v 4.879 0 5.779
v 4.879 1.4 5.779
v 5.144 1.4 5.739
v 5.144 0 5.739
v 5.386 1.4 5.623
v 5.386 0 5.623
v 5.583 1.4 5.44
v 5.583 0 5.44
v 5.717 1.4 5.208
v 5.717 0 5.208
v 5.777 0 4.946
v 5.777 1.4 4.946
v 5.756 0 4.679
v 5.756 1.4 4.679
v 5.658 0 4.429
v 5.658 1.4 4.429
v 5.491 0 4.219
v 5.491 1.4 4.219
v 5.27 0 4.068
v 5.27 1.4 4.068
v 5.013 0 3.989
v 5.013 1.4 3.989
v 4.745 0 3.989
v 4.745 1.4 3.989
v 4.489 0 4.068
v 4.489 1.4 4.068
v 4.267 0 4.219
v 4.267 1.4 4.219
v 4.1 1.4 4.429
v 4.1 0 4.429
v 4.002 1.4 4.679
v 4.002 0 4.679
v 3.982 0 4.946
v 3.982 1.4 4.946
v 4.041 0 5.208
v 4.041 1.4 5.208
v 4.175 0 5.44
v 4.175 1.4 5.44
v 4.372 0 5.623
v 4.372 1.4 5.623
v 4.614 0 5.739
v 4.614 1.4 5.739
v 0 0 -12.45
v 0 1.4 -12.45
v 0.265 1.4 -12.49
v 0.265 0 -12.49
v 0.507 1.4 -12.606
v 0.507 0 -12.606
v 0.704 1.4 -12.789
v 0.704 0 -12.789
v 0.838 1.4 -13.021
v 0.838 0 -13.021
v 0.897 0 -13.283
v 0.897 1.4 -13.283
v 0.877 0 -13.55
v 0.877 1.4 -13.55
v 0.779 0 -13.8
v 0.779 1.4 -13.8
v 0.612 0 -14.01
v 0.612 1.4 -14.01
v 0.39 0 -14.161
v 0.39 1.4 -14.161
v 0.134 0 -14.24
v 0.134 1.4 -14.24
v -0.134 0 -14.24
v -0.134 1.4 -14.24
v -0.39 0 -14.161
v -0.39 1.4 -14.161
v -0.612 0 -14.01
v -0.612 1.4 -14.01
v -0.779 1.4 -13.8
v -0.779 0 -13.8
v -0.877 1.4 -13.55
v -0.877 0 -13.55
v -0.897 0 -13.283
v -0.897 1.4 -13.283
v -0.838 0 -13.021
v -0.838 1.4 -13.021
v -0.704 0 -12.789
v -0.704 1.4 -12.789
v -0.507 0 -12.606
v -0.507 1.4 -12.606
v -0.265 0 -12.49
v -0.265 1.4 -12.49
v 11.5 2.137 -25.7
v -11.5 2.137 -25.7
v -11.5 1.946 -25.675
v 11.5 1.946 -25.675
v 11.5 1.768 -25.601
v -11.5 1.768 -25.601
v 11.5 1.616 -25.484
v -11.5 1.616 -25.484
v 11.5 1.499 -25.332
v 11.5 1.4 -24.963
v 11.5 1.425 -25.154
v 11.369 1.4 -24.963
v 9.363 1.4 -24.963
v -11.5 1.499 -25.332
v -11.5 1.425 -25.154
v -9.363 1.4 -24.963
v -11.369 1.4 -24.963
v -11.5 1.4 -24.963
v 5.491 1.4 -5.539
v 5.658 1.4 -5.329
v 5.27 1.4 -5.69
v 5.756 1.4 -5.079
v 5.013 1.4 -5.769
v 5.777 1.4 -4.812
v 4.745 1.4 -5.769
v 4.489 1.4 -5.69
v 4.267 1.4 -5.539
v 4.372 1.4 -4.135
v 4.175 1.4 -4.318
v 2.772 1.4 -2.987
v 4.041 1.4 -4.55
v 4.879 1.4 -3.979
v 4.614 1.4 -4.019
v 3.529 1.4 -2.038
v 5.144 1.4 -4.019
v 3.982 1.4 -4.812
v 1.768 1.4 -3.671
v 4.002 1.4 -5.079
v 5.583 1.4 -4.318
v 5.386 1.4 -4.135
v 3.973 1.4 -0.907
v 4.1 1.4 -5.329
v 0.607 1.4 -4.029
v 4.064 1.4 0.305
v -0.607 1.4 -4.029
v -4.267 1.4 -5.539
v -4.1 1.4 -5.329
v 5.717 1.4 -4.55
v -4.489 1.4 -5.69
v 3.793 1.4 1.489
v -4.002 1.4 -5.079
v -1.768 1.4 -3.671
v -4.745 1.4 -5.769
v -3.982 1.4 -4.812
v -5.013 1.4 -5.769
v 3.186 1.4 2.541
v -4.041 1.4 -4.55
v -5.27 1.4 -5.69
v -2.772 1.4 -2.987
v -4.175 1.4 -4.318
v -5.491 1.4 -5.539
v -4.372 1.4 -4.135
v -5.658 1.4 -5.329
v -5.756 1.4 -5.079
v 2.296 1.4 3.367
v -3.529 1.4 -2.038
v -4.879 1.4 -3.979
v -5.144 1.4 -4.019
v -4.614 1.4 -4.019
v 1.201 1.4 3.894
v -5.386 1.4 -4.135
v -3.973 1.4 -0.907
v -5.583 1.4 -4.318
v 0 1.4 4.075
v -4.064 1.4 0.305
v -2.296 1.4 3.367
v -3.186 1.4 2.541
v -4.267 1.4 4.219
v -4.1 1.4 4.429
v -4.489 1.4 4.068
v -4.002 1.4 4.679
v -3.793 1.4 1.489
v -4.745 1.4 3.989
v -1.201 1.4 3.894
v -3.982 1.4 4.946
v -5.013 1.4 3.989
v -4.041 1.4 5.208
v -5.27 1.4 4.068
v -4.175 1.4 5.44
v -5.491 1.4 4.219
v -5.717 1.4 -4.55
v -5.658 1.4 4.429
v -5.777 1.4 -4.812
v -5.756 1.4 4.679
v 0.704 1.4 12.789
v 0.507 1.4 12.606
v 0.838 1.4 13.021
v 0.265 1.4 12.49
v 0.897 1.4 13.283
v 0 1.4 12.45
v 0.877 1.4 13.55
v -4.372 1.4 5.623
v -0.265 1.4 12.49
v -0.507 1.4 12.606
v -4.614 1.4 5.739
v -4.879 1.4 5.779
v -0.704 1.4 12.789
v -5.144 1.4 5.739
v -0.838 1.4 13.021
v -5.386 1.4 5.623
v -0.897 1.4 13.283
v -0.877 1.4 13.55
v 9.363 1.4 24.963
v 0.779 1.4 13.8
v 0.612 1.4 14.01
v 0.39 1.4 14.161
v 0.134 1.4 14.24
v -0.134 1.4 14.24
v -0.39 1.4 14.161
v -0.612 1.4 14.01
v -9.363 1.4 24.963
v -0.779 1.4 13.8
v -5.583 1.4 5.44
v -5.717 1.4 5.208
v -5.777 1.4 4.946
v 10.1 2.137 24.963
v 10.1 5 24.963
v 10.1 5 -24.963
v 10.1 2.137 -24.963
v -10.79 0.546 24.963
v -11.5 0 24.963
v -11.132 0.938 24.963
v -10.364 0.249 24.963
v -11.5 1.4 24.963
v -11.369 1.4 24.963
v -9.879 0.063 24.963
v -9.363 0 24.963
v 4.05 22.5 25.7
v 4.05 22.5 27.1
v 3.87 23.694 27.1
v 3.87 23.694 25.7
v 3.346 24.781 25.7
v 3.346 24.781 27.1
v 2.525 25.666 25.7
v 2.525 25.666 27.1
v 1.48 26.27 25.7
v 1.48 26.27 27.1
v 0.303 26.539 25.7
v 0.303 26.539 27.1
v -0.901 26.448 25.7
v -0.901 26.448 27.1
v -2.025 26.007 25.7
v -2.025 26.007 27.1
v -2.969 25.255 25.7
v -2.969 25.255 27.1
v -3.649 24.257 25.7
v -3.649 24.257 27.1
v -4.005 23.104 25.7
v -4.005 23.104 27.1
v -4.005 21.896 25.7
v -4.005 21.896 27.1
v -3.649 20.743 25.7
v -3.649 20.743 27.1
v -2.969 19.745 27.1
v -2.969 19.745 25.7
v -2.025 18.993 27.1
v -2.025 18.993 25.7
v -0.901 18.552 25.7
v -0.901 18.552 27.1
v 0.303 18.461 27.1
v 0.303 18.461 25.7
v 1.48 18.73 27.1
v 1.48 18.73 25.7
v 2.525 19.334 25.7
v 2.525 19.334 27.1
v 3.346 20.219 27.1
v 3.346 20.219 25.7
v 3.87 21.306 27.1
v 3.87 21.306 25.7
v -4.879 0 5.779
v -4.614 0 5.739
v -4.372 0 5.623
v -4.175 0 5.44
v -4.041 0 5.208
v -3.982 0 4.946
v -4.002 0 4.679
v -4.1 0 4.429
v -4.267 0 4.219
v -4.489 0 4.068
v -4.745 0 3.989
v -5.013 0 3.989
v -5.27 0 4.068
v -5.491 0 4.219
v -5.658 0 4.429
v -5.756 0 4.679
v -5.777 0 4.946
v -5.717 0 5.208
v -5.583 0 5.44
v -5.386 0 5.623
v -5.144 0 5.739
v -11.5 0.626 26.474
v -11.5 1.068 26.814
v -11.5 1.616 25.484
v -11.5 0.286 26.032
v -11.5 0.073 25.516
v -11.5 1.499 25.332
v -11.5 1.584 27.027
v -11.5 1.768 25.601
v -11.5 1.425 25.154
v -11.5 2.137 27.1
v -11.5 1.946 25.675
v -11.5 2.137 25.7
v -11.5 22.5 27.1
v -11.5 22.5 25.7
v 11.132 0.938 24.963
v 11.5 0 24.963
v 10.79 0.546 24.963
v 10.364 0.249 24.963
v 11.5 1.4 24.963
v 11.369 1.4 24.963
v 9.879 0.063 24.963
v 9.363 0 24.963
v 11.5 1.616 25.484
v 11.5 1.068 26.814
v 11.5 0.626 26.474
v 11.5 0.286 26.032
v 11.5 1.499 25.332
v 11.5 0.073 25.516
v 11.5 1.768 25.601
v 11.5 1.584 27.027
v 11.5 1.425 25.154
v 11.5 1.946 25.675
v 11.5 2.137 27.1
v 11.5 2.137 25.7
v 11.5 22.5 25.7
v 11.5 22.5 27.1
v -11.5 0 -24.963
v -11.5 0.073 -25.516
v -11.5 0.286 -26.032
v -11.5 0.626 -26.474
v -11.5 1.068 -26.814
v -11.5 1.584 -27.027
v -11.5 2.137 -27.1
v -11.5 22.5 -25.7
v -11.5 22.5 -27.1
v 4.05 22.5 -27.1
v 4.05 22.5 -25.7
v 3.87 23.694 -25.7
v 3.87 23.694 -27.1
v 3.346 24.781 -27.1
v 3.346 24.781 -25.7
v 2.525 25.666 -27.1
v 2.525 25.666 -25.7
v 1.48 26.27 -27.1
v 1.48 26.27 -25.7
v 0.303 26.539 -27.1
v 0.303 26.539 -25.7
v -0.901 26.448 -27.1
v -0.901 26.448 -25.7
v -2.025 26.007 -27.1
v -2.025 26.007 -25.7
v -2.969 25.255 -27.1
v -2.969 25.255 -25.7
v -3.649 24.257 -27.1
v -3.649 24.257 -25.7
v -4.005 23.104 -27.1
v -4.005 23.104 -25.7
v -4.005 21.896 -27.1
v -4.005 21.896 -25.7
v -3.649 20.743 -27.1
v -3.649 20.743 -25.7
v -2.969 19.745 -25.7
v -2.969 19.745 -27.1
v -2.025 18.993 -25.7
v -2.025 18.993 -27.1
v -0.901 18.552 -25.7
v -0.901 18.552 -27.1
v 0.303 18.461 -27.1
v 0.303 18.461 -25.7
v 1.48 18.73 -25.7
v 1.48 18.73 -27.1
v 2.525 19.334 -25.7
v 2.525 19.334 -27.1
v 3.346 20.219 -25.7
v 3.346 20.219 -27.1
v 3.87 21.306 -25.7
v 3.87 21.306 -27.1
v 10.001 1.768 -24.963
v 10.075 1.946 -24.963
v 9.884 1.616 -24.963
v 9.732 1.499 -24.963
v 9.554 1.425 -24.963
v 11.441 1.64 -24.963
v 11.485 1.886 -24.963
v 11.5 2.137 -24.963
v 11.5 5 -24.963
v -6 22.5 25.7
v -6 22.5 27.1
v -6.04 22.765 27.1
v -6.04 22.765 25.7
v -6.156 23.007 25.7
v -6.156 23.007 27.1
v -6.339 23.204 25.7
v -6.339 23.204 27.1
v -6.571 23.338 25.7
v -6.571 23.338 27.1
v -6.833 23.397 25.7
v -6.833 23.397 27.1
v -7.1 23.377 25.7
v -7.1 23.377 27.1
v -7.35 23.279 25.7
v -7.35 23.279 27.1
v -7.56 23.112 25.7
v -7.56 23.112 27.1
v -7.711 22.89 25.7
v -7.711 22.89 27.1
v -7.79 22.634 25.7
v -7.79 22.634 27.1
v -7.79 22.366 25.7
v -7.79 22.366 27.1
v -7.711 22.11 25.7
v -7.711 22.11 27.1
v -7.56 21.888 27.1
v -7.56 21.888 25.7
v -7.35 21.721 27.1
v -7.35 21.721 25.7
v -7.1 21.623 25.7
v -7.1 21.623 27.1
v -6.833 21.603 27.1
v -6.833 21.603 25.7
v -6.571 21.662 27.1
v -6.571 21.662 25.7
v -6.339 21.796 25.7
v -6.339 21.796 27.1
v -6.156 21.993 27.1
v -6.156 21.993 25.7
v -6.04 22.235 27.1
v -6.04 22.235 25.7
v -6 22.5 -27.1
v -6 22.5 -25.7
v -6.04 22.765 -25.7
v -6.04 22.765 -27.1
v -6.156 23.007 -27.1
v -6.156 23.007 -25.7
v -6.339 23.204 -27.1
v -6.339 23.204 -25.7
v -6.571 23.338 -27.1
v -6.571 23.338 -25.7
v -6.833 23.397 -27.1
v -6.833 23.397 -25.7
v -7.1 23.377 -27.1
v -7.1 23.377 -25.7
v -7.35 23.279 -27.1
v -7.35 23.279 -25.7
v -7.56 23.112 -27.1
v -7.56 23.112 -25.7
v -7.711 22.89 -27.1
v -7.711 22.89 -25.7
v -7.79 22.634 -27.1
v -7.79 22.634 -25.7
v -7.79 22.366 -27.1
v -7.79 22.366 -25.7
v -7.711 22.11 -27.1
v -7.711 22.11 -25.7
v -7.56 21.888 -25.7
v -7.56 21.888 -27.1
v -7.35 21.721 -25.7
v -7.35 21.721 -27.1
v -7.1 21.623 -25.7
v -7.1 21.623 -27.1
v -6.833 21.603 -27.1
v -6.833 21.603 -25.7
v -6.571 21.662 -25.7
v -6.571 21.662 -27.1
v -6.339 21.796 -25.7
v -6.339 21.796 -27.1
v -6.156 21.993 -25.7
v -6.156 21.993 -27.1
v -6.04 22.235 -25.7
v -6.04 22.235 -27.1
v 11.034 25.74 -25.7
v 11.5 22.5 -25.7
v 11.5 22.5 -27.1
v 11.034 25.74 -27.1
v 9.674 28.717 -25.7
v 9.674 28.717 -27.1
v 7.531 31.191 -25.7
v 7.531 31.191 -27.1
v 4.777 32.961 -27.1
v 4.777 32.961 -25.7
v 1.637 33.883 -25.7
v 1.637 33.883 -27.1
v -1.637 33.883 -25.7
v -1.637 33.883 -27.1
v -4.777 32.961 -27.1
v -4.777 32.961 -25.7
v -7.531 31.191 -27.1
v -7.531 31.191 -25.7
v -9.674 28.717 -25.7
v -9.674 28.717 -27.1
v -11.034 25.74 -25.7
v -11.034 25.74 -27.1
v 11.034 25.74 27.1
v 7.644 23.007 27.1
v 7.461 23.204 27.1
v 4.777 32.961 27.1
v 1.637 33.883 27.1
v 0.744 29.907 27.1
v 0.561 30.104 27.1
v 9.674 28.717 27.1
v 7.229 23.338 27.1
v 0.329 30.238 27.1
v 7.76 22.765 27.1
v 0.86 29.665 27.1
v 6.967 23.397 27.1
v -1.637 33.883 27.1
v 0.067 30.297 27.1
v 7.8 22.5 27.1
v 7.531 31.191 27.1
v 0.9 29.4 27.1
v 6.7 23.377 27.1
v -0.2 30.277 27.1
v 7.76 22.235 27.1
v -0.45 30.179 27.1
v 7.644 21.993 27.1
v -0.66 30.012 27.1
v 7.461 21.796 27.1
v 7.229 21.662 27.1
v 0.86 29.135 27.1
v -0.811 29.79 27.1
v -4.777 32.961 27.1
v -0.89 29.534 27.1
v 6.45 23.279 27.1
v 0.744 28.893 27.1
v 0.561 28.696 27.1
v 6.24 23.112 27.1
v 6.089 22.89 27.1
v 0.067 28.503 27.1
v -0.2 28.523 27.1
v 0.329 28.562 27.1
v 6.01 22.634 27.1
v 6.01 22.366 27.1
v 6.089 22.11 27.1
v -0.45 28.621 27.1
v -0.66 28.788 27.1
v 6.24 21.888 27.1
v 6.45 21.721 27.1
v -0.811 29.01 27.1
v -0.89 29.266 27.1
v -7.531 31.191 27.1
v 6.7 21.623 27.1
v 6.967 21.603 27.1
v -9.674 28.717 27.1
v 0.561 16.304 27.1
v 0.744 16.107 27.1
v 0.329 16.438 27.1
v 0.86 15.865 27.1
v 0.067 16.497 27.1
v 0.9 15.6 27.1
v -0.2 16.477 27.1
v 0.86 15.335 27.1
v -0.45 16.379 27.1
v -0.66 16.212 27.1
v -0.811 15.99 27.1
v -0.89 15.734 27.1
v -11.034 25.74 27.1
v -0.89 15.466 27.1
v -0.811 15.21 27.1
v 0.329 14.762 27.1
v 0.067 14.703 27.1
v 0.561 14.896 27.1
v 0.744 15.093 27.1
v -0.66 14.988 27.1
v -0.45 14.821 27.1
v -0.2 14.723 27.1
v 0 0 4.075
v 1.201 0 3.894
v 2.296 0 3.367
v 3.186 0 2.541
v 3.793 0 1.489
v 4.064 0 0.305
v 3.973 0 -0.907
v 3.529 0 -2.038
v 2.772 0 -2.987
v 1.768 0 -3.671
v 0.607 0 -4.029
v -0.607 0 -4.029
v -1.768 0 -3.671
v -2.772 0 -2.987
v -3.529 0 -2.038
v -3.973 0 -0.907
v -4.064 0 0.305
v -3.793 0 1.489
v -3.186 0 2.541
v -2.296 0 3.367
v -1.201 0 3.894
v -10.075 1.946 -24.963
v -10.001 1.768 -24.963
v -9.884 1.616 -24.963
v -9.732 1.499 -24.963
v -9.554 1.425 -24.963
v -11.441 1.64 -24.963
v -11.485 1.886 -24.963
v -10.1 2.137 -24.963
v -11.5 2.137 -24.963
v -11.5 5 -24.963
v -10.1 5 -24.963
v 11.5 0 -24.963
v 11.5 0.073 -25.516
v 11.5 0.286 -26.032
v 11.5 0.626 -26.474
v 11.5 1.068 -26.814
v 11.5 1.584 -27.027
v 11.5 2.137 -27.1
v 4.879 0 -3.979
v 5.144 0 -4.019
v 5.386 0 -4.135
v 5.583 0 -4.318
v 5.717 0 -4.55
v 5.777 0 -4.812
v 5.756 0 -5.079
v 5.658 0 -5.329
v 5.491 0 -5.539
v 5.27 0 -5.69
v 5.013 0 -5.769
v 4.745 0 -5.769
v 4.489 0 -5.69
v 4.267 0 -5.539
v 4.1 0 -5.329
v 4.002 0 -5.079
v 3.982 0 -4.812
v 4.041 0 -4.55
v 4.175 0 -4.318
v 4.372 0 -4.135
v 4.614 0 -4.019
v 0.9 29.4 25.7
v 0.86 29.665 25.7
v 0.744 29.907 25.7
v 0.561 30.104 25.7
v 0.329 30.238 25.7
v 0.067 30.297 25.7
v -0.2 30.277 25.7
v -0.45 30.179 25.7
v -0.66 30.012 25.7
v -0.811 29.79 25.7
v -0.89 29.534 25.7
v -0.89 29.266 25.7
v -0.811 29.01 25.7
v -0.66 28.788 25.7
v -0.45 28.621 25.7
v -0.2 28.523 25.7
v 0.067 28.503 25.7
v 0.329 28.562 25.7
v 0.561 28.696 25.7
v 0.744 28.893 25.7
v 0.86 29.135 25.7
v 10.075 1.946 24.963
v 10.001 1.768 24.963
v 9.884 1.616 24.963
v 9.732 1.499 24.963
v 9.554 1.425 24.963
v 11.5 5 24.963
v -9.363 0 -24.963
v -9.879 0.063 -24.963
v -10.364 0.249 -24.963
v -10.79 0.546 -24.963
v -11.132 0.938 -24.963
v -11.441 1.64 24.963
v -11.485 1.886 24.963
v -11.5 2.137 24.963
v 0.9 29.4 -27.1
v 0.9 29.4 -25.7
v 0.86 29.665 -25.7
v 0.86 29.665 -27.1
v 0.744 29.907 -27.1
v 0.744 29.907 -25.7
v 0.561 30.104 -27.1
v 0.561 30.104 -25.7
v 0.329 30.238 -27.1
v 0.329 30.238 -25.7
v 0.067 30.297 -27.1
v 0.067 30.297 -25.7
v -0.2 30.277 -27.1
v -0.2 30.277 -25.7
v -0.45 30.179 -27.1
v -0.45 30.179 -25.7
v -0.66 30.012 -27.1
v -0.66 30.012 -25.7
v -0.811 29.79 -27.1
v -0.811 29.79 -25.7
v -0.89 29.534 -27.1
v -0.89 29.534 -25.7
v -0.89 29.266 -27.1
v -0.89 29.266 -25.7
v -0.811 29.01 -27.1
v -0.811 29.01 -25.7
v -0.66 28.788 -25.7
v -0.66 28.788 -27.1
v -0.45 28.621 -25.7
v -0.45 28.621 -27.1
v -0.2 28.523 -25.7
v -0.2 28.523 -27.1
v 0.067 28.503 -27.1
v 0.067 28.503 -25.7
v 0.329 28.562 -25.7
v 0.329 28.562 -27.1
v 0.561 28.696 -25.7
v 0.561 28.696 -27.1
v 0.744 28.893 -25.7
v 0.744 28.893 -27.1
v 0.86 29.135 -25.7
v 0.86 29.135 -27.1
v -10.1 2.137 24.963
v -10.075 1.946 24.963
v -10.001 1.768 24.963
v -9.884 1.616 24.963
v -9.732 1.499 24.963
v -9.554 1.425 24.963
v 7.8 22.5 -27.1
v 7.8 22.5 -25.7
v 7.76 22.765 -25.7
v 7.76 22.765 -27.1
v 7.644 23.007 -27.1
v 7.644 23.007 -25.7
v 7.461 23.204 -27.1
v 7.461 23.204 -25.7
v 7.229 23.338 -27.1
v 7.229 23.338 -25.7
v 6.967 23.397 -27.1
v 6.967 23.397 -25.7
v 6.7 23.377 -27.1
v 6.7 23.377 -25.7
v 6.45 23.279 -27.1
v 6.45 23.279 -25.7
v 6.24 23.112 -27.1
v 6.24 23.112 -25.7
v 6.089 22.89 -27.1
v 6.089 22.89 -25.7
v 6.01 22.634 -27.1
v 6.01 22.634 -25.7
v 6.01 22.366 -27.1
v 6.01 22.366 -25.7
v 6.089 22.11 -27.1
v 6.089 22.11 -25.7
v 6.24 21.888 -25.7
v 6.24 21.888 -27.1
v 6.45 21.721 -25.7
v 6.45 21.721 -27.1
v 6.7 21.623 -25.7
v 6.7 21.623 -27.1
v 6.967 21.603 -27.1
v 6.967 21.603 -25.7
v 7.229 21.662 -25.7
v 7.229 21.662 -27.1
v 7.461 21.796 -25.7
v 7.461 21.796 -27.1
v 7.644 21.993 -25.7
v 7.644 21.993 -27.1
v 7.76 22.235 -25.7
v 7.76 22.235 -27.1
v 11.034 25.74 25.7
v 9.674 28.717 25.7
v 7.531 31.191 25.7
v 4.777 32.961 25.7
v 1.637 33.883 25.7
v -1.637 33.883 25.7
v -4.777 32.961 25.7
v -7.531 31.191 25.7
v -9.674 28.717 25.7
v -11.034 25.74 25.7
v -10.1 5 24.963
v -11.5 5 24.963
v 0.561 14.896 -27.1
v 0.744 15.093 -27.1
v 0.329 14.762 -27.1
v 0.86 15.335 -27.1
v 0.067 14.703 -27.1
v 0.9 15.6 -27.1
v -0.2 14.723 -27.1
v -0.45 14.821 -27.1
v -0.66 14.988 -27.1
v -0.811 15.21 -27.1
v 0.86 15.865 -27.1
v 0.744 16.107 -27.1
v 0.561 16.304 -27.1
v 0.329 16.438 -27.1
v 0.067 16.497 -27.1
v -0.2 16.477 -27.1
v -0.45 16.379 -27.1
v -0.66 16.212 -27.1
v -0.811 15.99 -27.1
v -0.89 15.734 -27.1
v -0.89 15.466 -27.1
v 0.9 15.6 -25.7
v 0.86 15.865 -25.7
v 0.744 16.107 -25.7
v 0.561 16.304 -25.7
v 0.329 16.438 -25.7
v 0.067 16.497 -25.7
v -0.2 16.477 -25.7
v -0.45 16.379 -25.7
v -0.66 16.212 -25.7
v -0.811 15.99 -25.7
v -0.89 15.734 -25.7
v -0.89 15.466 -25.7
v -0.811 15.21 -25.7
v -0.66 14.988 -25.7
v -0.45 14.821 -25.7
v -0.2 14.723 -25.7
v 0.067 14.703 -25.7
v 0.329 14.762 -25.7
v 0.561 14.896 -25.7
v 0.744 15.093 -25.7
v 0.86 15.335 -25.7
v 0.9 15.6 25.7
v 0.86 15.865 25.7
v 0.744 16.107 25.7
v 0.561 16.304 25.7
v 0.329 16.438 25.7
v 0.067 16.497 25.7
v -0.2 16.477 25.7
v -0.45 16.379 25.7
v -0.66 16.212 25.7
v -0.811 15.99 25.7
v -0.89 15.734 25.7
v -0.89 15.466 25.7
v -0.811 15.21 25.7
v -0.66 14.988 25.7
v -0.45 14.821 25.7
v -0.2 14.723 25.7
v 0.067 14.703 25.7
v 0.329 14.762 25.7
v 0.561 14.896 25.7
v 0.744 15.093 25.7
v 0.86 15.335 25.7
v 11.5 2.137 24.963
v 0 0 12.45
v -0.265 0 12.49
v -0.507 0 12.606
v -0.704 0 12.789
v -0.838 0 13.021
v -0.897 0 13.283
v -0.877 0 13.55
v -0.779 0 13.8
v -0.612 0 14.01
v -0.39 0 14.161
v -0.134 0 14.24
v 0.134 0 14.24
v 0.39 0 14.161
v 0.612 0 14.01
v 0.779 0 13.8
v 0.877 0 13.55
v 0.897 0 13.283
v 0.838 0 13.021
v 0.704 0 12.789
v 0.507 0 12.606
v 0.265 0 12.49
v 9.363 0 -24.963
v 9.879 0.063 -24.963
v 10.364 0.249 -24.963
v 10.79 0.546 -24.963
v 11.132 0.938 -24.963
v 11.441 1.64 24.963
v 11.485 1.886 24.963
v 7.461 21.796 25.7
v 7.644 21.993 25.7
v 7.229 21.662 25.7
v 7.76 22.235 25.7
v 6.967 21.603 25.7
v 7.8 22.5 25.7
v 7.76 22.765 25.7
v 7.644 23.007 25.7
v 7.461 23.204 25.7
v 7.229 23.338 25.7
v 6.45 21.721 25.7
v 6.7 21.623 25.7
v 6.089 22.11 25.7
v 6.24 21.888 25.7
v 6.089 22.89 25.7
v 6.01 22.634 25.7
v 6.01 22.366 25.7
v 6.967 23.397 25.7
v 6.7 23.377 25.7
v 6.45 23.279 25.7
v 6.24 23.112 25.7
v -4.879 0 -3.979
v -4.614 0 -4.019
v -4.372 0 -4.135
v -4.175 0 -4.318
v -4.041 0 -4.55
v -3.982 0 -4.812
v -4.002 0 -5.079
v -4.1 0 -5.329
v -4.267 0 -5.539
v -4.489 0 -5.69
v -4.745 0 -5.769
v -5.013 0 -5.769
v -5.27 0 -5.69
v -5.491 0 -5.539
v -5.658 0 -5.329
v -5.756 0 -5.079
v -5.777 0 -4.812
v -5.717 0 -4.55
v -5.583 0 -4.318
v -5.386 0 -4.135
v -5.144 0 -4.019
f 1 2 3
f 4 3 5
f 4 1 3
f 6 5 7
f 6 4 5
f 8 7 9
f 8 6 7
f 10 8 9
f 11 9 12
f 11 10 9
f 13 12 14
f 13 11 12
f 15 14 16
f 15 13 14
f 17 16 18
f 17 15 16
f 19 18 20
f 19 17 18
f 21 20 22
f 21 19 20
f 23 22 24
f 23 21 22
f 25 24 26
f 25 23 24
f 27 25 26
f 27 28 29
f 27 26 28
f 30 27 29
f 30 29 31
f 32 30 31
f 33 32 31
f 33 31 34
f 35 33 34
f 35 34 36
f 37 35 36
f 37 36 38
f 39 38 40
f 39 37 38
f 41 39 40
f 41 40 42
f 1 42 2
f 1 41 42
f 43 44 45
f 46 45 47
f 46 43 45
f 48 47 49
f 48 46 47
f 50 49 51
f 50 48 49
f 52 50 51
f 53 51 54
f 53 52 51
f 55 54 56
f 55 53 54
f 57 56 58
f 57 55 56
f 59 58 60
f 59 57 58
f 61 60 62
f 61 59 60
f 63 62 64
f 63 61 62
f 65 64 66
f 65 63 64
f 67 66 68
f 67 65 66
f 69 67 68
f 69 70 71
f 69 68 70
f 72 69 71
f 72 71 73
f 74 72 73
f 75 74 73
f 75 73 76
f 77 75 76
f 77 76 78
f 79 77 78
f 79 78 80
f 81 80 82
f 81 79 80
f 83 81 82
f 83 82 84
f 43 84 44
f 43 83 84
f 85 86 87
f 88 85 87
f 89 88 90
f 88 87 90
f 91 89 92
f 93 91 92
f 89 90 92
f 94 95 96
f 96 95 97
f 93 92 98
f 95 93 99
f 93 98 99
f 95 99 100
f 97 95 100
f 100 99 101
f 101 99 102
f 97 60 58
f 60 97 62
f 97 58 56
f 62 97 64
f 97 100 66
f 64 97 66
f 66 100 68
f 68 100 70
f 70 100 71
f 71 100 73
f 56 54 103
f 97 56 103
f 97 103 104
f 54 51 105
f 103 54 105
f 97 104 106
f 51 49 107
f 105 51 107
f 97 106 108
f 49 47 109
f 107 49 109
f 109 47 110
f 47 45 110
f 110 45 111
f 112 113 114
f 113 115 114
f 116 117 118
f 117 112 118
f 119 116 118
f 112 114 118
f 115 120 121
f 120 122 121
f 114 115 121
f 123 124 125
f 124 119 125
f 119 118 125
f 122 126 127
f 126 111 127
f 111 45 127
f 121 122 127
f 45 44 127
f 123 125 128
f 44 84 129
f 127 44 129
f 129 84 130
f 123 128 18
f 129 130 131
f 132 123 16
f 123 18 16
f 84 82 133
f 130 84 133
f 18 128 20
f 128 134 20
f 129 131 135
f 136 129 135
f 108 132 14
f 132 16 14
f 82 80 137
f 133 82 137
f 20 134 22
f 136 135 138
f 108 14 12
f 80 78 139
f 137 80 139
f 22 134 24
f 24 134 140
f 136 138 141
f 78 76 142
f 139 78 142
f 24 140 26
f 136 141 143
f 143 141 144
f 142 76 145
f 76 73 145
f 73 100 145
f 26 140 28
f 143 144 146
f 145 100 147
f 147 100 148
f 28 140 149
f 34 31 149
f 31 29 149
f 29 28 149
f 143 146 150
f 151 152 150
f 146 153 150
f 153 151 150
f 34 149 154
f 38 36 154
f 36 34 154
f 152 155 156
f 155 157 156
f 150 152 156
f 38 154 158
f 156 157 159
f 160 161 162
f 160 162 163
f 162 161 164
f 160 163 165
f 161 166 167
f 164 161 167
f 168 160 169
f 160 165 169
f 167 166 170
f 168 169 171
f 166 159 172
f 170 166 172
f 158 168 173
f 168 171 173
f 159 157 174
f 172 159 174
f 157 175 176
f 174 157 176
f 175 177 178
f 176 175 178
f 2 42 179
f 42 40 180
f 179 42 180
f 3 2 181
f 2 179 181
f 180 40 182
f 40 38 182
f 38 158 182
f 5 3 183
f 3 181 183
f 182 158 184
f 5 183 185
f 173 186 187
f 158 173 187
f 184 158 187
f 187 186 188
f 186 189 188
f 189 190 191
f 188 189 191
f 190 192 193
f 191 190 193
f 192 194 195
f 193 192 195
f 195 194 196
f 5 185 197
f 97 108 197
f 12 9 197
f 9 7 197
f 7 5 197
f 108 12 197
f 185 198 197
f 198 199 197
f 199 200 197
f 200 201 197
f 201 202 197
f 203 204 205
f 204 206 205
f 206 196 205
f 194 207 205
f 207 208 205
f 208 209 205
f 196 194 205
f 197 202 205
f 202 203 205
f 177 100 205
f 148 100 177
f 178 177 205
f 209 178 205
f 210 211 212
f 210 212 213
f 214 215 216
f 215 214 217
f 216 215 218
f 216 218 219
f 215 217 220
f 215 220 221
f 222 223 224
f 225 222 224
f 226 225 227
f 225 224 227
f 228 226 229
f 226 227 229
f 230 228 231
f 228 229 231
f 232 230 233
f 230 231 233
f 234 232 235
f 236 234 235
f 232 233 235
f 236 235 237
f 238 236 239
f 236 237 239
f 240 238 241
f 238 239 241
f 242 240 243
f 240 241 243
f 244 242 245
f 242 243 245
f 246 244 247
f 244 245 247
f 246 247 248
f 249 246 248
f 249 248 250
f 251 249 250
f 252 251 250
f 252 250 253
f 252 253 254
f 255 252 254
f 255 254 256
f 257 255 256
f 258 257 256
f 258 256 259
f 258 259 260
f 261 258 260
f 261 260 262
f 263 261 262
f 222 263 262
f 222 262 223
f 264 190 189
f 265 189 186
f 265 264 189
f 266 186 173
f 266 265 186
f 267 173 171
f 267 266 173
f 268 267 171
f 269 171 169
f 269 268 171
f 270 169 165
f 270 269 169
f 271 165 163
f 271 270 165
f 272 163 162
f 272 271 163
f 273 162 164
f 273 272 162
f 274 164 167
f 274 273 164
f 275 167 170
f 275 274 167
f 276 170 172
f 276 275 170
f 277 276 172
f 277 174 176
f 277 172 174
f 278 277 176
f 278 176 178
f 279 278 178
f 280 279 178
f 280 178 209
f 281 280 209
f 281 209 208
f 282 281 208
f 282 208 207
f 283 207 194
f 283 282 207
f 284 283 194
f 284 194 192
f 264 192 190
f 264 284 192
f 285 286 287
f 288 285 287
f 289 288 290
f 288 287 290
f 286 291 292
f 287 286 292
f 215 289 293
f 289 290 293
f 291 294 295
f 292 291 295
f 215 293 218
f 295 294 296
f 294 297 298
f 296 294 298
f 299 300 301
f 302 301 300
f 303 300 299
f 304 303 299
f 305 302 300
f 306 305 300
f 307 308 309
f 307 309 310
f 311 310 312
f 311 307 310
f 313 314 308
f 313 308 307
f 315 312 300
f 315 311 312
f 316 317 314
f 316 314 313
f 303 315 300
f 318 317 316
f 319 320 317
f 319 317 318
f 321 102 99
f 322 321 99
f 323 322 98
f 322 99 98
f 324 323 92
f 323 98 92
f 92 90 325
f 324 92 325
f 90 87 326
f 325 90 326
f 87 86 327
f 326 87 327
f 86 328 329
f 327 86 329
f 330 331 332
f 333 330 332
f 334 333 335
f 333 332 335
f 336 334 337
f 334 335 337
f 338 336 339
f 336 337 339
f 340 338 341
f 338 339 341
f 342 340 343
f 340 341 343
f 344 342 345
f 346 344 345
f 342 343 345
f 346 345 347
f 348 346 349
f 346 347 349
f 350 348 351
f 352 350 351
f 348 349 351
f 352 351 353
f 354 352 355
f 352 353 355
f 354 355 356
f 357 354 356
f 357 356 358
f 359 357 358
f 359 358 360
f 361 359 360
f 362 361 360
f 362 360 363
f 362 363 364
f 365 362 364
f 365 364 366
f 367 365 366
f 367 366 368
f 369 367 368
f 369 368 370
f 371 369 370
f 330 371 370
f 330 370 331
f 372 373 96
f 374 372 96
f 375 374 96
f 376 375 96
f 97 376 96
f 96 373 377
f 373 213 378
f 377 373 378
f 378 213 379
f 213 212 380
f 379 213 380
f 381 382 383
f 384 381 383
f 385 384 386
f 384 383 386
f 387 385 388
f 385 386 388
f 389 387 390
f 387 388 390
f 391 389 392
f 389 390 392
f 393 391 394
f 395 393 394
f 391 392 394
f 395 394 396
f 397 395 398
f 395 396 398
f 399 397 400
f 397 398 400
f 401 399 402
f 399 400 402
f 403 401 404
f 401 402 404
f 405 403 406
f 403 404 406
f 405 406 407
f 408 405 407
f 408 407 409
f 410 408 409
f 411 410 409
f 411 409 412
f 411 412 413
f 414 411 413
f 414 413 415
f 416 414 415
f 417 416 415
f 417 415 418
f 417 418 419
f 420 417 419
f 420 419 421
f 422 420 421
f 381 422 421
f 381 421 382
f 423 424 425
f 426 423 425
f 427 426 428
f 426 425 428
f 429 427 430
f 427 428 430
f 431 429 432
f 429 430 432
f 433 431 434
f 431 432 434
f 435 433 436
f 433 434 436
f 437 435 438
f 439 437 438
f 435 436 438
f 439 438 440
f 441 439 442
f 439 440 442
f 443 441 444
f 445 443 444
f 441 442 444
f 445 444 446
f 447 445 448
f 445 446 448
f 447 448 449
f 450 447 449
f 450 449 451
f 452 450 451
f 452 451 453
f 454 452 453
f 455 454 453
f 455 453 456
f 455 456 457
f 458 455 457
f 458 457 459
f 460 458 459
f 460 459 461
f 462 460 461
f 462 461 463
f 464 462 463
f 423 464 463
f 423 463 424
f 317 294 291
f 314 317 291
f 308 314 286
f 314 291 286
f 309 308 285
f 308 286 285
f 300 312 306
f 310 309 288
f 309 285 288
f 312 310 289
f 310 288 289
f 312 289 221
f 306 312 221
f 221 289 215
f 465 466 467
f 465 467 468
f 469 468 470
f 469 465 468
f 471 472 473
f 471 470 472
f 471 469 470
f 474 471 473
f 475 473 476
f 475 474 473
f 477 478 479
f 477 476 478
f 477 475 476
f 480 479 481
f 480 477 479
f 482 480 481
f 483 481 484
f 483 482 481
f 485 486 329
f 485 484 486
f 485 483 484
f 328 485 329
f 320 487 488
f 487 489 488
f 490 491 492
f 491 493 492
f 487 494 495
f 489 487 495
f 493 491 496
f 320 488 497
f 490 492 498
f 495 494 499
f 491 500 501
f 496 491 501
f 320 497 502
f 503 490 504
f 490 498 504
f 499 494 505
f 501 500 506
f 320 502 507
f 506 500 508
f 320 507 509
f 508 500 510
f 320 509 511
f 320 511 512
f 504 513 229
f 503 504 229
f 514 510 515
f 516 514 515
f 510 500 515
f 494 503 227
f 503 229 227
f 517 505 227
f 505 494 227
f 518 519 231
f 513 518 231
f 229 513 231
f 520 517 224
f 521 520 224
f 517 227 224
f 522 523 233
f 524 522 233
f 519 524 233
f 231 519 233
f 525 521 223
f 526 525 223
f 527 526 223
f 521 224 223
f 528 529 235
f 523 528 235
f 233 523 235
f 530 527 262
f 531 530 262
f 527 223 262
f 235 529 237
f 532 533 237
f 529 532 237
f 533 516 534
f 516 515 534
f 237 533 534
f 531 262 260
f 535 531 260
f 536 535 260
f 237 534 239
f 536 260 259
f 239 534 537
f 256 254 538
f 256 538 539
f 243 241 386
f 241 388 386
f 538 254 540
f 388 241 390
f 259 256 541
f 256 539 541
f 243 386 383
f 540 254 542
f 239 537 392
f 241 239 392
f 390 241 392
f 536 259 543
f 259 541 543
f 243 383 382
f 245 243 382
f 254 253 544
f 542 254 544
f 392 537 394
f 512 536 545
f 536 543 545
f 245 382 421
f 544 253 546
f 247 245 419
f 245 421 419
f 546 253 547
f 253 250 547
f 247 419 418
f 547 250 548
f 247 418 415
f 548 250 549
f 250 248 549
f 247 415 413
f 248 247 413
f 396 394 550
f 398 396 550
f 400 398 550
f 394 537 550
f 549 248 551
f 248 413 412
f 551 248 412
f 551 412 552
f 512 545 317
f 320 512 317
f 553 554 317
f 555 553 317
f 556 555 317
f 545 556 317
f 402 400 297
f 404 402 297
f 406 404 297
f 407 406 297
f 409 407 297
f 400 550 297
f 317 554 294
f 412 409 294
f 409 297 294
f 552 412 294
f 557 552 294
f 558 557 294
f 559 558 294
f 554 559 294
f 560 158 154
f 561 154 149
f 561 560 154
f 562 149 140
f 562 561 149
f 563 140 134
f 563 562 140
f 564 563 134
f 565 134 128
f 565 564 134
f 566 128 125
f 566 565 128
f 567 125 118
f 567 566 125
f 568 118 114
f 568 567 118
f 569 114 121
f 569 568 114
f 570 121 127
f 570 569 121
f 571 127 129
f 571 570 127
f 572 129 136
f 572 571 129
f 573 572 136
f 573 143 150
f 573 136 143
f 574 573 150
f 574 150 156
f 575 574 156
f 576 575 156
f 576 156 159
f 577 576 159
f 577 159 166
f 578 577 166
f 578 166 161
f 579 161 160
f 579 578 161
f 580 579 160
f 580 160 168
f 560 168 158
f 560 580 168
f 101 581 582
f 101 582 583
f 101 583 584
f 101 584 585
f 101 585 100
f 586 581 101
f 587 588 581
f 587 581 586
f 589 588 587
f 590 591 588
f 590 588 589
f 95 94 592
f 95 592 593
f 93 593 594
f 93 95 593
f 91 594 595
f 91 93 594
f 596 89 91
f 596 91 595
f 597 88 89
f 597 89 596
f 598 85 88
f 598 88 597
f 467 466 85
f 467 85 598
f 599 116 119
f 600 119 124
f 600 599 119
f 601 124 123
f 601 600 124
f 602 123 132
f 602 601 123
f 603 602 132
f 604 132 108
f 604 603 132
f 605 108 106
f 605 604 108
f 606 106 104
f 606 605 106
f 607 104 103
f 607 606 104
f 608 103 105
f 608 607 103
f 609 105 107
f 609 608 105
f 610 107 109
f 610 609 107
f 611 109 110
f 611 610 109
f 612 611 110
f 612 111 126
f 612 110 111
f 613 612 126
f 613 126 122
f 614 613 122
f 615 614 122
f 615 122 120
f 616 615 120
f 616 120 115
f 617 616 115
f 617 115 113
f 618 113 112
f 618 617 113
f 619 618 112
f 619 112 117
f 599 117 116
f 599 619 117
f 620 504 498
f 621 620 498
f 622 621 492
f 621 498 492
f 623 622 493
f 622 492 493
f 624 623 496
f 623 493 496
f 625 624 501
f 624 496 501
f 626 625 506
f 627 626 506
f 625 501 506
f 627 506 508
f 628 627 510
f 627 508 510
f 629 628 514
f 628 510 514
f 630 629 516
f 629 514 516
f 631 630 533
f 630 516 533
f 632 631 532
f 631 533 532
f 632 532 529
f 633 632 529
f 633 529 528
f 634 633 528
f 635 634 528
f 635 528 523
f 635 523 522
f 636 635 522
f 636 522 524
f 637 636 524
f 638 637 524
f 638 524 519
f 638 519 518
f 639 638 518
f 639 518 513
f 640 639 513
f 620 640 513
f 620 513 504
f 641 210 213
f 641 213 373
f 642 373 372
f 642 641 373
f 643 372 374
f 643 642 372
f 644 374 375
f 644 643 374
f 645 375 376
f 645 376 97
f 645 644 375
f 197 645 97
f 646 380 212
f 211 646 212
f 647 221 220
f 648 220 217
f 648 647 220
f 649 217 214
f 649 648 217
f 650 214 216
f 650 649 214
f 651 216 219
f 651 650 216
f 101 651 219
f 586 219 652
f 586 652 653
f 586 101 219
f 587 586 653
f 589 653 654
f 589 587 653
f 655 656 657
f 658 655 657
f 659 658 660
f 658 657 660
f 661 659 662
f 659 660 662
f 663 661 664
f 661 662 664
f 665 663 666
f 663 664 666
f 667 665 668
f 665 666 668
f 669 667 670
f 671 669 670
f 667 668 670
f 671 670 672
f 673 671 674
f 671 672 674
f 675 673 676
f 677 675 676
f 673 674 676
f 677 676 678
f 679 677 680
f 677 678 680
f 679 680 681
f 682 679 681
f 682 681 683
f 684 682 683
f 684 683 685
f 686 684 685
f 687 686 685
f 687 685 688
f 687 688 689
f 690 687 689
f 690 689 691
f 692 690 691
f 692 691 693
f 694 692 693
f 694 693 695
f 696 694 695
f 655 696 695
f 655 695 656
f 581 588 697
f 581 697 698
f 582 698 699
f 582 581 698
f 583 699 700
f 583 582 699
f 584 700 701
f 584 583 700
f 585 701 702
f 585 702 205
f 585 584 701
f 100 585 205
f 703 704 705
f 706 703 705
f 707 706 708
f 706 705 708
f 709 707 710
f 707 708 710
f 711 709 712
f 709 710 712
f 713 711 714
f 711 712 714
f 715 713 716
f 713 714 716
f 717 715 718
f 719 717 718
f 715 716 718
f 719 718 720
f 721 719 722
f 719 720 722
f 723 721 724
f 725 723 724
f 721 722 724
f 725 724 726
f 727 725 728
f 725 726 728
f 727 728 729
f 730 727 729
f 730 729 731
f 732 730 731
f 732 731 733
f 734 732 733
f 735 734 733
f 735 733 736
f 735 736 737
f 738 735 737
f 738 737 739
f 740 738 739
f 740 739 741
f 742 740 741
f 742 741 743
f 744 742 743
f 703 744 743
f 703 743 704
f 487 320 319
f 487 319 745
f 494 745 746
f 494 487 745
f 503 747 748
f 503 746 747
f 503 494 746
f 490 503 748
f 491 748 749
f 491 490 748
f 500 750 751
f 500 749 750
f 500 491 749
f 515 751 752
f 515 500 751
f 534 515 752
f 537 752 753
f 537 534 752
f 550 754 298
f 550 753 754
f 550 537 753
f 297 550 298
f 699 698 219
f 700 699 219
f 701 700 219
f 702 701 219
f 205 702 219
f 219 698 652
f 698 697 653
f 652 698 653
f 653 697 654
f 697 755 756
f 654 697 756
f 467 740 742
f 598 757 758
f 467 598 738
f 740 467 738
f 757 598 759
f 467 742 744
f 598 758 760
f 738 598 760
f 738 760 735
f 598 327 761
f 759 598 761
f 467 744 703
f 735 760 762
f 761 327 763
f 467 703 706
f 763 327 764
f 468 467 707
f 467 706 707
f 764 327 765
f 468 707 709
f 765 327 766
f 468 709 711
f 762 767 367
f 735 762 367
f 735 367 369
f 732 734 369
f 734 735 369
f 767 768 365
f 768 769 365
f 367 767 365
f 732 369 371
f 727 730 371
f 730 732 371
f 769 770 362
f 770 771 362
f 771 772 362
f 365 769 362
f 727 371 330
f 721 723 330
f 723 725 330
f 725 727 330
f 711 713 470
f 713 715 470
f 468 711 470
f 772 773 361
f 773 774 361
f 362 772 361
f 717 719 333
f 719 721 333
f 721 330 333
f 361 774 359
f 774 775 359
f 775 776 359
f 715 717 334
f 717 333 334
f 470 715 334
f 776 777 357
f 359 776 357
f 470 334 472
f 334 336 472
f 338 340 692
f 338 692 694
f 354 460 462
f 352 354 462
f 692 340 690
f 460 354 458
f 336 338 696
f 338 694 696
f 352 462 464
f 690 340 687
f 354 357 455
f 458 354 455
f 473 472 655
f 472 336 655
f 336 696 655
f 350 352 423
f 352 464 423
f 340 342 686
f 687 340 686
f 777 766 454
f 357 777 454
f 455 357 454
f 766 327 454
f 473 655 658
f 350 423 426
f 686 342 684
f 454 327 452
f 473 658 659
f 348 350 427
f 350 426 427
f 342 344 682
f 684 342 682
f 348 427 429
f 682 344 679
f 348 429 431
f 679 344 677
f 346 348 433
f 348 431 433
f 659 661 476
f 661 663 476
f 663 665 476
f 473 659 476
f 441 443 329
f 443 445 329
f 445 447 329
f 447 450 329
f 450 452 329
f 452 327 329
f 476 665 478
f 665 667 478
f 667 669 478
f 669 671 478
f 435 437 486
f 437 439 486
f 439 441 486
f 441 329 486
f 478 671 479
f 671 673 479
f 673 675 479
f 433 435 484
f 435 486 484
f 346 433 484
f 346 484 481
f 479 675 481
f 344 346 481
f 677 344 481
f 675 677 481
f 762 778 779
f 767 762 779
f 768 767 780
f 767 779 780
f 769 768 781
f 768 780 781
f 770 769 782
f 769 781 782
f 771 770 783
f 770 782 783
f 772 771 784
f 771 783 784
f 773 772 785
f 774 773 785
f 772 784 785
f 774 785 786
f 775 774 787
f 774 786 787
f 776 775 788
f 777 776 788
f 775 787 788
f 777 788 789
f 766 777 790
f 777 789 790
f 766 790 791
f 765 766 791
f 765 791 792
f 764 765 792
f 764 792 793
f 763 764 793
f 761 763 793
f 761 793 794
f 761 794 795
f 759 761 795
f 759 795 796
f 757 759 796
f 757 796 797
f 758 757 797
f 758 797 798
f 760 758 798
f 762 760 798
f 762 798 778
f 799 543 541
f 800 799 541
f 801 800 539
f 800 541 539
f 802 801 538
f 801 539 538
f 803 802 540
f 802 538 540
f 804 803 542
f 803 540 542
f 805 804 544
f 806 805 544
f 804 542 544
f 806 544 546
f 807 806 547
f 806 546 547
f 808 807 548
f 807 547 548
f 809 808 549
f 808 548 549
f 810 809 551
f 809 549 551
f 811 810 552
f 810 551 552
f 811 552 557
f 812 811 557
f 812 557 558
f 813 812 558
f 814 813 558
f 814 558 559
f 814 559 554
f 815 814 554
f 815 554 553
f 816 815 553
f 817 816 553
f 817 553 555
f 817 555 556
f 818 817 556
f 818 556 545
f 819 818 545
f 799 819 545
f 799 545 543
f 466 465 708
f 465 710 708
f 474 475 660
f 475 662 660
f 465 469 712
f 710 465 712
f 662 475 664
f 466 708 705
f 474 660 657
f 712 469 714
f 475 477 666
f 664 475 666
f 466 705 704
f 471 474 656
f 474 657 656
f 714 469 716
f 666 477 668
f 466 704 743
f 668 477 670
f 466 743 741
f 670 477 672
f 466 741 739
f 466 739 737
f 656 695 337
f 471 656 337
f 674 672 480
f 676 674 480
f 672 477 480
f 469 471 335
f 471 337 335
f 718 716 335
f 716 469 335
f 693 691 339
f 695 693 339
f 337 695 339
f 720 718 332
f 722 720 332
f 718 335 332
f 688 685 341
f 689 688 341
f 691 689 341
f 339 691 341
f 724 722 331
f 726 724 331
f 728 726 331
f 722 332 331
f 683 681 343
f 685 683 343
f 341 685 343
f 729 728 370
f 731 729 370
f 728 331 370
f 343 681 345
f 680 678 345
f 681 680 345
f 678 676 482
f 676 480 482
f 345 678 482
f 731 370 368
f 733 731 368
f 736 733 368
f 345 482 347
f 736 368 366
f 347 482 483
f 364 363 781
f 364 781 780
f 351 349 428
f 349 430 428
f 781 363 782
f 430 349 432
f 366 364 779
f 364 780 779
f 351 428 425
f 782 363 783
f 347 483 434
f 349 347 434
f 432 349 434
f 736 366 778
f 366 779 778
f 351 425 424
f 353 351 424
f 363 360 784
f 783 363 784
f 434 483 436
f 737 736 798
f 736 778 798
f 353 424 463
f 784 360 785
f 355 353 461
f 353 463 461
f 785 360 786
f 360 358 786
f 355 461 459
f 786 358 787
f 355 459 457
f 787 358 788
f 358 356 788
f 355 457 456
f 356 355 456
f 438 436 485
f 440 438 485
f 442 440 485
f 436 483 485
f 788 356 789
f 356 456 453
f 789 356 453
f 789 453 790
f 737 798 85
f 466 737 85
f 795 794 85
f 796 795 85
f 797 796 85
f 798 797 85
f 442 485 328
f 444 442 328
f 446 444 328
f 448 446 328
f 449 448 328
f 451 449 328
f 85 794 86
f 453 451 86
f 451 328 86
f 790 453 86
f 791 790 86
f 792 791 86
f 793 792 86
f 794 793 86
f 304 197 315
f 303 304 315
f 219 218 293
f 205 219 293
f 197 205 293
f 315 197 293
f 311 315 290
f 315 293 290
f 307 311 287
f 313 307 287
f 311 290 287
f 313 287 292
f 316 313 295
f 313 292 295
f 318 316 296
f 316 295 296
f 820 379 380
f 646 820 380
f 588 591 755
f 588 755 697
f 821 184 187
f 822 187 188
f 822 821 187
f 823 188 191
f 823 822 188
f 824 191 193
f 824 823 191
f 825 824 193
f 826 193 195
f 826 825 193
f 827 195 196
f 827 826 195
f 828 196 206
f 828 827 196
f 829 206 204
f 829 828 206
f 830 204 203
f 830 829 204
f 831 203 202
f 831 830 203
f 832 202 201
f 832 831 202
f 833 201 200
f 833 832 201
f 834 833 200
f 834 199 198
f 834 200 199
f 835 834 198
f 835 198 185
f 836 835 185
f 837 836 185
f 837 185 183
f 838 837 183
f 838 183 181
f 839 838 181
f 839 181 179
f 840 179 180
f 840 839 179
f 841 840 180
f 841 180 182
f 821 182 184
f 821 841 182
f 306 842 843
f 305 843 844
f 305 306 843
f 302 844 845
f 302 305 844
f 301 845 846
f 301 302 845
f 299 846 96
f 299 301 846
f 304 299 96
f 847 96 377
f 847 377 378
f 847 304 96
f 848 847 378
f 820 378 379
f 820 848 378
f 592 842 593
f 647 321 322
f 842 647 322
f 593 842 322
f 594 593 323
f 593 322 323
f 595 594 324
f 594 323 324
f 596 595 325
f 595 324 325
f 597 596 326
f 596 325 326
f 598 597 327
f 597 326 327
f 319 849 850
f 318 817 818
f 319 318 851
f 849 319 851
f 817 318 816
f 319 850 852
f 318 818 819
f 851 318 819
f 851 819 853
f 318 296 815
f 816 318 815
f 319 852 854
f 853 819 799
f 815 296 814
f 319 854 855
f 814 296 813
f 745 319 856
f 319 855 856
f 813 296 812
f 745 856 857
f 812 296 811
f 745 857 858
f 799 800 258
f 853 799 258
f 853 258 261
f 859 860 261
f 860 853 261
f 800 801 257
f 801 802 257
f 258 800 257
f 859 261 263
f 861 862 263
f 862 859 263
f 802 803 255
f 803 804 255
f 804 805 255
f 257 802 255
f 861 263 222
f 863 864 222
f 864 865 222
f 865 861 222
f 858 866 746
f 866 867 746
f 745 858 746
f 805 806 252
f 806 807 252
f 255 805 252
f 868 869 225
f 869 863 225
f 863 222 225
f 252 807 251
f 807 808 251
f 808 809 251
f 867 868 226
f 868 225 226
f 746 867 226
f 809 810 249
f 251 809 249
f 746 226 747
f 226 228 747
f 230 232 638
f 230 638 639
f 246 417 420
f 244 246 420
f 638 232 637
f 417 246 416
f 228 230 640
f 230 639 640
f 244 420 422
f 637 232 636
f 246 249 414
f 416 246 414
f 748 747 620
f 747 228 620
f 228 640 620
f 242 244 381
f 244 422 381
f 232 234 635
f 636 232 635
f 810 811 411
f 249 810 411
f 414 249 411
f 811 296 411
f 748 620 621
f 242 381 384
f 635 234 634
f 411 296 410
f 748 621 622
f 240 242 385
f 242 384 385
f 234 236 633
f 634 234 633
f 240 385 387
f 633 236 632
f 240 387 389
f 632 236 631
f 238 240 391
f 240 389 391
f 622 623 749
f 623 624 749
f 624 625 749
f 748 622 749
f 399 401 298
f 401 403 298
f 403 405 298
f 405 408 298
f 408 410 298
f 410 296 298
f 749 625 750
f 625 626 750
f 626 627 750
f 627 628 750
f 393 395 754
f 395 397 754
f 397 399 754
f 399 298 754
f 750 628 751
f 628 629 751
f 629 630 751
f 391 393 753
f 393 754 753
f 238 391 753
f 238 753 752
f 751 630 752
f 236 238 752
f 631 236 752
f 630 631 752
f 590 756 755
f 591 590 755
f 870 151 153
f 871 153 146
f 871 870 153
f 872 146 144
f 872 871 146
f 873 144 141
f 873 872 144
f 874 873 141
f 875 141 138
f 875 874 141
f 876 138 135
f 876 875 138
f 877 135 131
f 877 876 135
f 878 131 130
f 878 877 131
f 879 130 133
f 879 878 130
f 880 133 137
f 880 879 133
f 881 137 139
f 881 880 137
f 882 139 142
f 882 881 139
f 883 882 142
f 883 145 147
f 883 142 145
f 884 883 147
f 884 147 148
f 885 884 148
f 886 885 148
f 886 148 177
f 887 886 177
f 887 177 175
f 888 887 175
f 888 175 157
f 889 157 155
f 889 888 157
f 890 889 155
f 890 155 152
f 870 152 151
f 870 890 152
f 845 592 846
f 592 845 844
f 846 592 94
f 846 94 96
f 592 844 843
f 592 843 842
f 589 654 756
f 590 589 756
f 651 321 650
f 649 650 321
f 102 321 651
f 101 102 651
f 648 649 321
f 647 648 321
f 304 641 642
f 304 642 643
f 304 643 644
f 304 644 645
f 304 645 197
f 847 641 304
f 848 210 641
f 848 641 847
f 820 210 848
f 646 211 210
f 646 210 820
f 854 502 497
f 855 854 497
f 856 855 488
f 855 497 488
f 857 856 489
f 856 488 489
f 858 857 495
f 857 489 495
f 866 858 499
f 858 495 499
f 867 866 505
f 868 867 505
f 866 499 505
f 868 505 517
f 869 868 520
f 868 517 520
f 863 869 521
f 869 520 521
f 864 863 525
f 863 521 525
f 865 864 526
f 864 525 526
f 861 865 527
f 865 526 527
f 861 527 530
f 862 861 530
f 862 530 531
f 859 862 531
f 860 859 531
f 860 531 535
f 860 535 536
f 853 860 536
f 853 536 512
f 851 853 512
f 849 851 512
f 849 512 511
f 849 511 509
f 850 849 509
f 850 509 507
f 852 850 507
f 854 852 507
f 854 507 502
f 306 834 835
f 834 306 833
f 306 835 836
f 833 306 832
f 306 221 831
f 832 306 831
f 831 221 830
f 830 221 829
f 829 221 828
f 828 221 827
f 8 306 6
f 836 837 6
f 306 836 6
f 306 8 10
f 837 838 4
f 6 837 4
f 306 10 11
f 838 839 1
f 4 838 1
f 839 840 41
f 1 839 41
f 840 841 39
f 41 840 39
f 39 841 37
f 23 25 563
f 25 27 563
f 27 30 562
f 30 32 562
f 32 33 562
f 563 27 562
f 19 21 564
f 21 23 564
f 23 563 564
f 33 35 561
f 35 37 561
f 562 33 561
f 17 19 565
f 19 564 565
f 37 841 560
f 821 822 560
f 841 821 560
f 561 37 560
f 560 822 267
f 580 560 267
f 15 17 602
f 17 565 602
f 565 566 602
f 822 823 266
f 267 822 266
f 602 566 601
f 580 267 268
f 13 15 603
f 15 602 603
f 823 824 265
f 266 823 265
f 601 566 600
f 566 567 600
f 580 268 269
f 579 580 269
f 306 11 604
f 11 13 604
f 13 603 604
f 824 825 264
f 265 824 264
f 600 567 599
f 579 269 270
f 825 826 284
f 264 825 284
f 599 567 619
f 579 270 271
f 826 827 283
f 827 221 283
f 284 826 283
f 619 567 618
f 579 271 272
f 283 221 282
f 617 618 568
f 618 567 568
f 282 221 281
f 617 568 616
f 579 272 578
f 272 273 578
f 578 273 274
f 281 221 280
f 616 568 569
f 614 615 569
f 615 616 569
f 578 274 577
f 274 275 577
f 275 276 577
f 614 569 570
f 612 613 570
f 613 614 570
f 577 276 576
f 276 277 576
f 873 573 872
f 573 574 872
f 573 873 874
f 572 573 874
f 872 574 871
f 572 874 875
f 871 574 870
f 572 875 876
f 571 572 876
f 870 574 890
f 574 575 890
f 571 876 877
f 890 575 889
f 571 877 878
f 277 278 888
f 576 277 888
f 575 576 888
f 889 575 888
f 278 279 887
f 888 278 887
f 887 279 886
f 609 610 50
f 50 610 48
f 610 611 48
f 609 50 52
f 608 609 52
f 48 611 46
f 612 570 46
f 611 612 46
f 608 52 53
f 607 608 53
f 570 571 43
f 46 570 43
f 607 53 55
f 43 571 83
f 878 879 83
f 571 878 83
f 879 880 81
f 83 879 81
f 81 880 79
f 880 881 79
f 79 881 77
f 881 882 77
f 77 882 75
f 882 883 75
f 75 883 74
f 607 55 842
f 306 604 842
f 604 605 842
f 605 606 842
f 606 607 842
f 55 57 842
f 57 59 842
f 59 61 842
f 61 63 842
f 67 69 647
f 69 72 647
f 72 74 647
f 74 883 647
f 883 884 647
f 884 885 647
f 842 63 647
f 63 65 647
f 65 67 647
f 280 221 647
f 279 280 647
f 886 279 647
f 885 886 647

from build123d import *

# Parameters (mm, degrees)
BASE_FLANGE1_START             = -11.5
BASE_FLANGE1_DEPTH             = 23
EDGE_FLANGE1_STRIP_W           = 7.0732
EDGE_FLANGE1_STRIP_H           = 1.4
EDGE_FLANGE1_STRIP_CUT_DEPTH   = 49.9268
EDGE_FLANGE1_STRIP_2_W         = 7.0732
EDGE_FLANGE1_STRIP_2_H         = 1.4
EDGE_FLANGE1_STRIP_CUT_2_DEPTH = 49.9268
EDGE_FLANGE1_DEPTH             = 49.9268
EDGE_FLANGE1_BEND_DEPTH        = 49.9268
FILLET1_RADIUS                 = 11.5
FILLET1_LENGTH                 = 1.4
FILLET2_RADIUS                 = 11.5
FILLET2_LENGTH                 = 1.4
SKETCH12_R                     = 4.05
SKETCH12_R_2                   = 0.9
CUT_EXTRUDE1_DEPTH             = 66.006845793
SKETCH13_R                     = 4.075
SKETCH13_R_2                   = 0.9
CUT_EXTRUDE2_DEPTH             = 45.973992485


# Read off the part's stored shape, not the designer's step: Base-Flange1
# Sheet-metal steps are written as plain solids
with BuildPart() as part:
    # Base-Flange1 outline → Base-Flange1 (new body)
    with BuildSketch(Plane(origin=(0, 0, 0), x_dir=(0, 0, -1), z_dir=(1, 0, 0)).offset(BASE_FLANGE1_START)):
        with BuildLine():
            Line((27.1, 2.1366), (27.1, 34))
            Line((27.1, 34), (25.7, 34))
            Line((25.7, 34), (25.7, 2.1366))
            ThreePointArc((25.7, 2.1366), (25.484254855, 1.615745145), (24.9634, 1.4))
            Line((24.9634, 1.4), (-24.9634, 1.4))
            ThreePointArc((-24.9634, 1.4), (-25.484254855, 1.615745145), (-25.7, 2.1366))
            Line((-25.7, 2.1366), (-25.7, 34))
            Line((-25.7, 34), (-27.1, 34))
            Line((-27.1, 34), (-27.1, 2.1366))
            ThreePointArc((-27.1, 2.1366), (-26.474204349, 0.625795651), (-24.9634, 0))
            Line((-24.9634, 0), (24.9634, 0))
            ThreePointArc((24.9634, 0), (26.474204349, 0.625795651), (27.1, 2.1366))
        make_face()
    extrude(amount=BASE_FLANGE1_DEPTH)

    # Edge-Flange1 strip (across the edge) → Edge-Flange1 strip cut (cut)
    with BuildSketch(Plane(origin=(11.5, 1.4, 24.9634), x_dir=(-1, 0, 0), z_dir=(0, 0, -1))):
        with Locations((-1.4, -0.7)):
            Rectangle(EDGE_FLANGE1_STRIP_W, EDGE_FLANGE1_STRIP_H)
    extrude(amount=EDGE_FLANGE1_STRIP_CUT_DEPTH, mode=Mode.SUBTRACT)

    # Edge-Flange1 strip 2 (across the edge) → Edge-Flange1 strip cut 2 (cut)
    with BuildSketch(Plane(origin=(-11.5, 1.4, -24.9634), x_dir=(1, 0, 0), z_dir=(0, 0, 1))):
        with Locations((-1.4, -0.7)):
            Rectangle(EDGE_FLANGE1_STRIP_2_W, EDGE_FLANGE1_STRIP_2_H)
    extrude(amount=EDGE_FLANGE1_STRIP_CUT_2_DEPTH, mode=Mode.SUBTRACT)

    # Edge-Flange1 section (across the edge) → Edge-Flange1 (add)
    with BuildSketch(Plane(origin=(11.5, 1.4, 24.9634), x_dir=(-1, 0, 0), z_dir=(0, 0, -1))):
        with BuildLine():
            Line((0, 0.7366), (0, 3.6))
            Line((0, 3.6), (1.4, 3.6))
            Line((1.4, 3.6), (1.4, 0.7366))
            ThreePointArc((1.4, 0.7366), (1.615745145, 0.215745145), (2.1366, 0))
            Line((2.1366, 0), (2.1366, -1.4))
            ThreePointArc((2.1366, -1.4), (0.625795651, -0.774204349), (0, 0.7366))
        make_face()
    extrude(amount=EDGE_FLANGE1_DEPTH)

    # Edge-Flange1 section 2 (across the edge) → Edge-Flange1 bend (add)
    with BuildSketch(Plane(origin=(-11.5, 1.4, -24.9634), x_dir=(1, 0, 0), z_dir=(0, 0, 1))):
        with BuildLine():
            Line((0, 0.7366), (0, 3.6))
            Line((0, 3.6), (1.4, 3.6))
            Line((1.4, 3.6), (1.4, 0.7366))
            ThreePointArc((1.4, 0.7366), (1.615745145, 0.215745145), (2.1366, 0))
            Line((2.1366, 0), (2.1366, -1.4))
            ThreePointArc((2.1366, -1.4), (0.625795651, -0.774204349), (0, 0.7366))
        make_face()
    extrude(amount=EDGE_FLANGE1_BEND_DEPTH)

    # Fillet1: full round fillet: the end face becomes a half cylinder, R = half its width
    fillet1_face = Plane((0, 34, 26.4), x_dir=(0, 0, 1), z_dir=(0, 1, 0))  # on the end face: x along it, z out of the body
    fillet1_slab = fillet1_face.offset(-FILLET1_RADIUS / 2) * Box(FILLET1_LENGTH, 2 * FILLET1_RADIUS, FILLET1_RADIUS, mode=Mode.PRIVATE)  # the body's end, R deep
    fillet1_round = Plane((0, 22.5, 26.4), x_dir=(0, 1, 0), z_dir=(0, 0, 1)) * Cylinder(FILLET1_RADIUS, FILLET1_LENGTH, mode=Mode.PRIVATE)  # its axis R under the face
    add(fillet1_slab - fillet1_round, mode=Mode.SUBTRACT)

    # Fillet2: full round fillet: the end face becomes a half cylinder, R = half its width
    fillet2_face = Plane((0, 34, -26.4), x_dir=(0, 0, 1), z_dir=(0, 1, 0))  # on the end face: x along it, z out of the body
    fillet2_slab = fillet2_face.offset(-FILLET2_RADIUS / 2) * Box(FILLET2_LENGTH, 2 * FILLET2_RADIUS, FILLET2_RADIUS, mode=Mode.PRIVATE)  # the body's end, R deep
    fillet2_round = Plane((0, 22.5, -26.4), x_dir=(0, 1, 0), z_dir=(0, 0, 1)) * Cylinder(FILLET2_RADIUS, FILLET2_LENGTH, mode=Mode.PRIVATE)  # its axis R under the face
    add(fillet2_slab - fillet2_round, mode=Mode.SUBTRACT)

    # Sketch12 → Cut-Extrude1 (cut, through all)
    with BuildSketch(Plane.XY.offset(27.1)):
        with Locations((0, 22.5)):
            Circle(SKETCH12_R)
        with Locations((0, 29.4)):
            Circle(SKETCH12_R_2)
        with Locations((6.9, 22.5)):
            Circle(SKETCH12_R_2)
        with Locations((0, 15.6)):
            Circle(SKETCH12_R_2)
        with Locations((-6.9, 22.5)):
            Circle(SKETCH12_R_2)
    extrude(amount=-CUT_EXTRUDE1_DEPTH, mode=Mode.SUBTRACT)

    # Sketch13 → Cut-Extrude2 (cut, through all)
    with BuildSketch(Plane(origin=(0, 0, 0), x_dir=(1, 0, 0), z_dir=(0, 1, 0))):
        with Locations(Location((0, 0, 0), (0, 0, 270))):
            Circle(SKETCH13_R)
        with Locations(Location((-4.87903679, 4.87903679, 0), (0, 0, 270))):
            Circle(SKETCH13_R_2)
        with Locations(Location((4.87903679, 4.87903679, 0), (0, 0, 270))):
            Circle(SKETCH13_R_2)
        with Locations(Location((4.87903679, -4.87903679, 0), (0, 0, 270))):
            Circle(SKETCH13_R_2)
        with Locations(Location((-4.87903679, -4.87903679, 0), (0, 0, 270))):
            Circle(SKETCH13_R_2)
        with Locations(Location((0, 13.35, 0), (0, 0, 270))):
            Circle(SKETCH13_R_2)
        with Locations(Location((0, -13.35, 0), (0, 0, 90))):
            Circle(SKETCH13_R_2)
    extrude(amount=CUT_EXTRUDE2_DEPTH, mode=Mode.SUBTRACT)


solid = part.part
